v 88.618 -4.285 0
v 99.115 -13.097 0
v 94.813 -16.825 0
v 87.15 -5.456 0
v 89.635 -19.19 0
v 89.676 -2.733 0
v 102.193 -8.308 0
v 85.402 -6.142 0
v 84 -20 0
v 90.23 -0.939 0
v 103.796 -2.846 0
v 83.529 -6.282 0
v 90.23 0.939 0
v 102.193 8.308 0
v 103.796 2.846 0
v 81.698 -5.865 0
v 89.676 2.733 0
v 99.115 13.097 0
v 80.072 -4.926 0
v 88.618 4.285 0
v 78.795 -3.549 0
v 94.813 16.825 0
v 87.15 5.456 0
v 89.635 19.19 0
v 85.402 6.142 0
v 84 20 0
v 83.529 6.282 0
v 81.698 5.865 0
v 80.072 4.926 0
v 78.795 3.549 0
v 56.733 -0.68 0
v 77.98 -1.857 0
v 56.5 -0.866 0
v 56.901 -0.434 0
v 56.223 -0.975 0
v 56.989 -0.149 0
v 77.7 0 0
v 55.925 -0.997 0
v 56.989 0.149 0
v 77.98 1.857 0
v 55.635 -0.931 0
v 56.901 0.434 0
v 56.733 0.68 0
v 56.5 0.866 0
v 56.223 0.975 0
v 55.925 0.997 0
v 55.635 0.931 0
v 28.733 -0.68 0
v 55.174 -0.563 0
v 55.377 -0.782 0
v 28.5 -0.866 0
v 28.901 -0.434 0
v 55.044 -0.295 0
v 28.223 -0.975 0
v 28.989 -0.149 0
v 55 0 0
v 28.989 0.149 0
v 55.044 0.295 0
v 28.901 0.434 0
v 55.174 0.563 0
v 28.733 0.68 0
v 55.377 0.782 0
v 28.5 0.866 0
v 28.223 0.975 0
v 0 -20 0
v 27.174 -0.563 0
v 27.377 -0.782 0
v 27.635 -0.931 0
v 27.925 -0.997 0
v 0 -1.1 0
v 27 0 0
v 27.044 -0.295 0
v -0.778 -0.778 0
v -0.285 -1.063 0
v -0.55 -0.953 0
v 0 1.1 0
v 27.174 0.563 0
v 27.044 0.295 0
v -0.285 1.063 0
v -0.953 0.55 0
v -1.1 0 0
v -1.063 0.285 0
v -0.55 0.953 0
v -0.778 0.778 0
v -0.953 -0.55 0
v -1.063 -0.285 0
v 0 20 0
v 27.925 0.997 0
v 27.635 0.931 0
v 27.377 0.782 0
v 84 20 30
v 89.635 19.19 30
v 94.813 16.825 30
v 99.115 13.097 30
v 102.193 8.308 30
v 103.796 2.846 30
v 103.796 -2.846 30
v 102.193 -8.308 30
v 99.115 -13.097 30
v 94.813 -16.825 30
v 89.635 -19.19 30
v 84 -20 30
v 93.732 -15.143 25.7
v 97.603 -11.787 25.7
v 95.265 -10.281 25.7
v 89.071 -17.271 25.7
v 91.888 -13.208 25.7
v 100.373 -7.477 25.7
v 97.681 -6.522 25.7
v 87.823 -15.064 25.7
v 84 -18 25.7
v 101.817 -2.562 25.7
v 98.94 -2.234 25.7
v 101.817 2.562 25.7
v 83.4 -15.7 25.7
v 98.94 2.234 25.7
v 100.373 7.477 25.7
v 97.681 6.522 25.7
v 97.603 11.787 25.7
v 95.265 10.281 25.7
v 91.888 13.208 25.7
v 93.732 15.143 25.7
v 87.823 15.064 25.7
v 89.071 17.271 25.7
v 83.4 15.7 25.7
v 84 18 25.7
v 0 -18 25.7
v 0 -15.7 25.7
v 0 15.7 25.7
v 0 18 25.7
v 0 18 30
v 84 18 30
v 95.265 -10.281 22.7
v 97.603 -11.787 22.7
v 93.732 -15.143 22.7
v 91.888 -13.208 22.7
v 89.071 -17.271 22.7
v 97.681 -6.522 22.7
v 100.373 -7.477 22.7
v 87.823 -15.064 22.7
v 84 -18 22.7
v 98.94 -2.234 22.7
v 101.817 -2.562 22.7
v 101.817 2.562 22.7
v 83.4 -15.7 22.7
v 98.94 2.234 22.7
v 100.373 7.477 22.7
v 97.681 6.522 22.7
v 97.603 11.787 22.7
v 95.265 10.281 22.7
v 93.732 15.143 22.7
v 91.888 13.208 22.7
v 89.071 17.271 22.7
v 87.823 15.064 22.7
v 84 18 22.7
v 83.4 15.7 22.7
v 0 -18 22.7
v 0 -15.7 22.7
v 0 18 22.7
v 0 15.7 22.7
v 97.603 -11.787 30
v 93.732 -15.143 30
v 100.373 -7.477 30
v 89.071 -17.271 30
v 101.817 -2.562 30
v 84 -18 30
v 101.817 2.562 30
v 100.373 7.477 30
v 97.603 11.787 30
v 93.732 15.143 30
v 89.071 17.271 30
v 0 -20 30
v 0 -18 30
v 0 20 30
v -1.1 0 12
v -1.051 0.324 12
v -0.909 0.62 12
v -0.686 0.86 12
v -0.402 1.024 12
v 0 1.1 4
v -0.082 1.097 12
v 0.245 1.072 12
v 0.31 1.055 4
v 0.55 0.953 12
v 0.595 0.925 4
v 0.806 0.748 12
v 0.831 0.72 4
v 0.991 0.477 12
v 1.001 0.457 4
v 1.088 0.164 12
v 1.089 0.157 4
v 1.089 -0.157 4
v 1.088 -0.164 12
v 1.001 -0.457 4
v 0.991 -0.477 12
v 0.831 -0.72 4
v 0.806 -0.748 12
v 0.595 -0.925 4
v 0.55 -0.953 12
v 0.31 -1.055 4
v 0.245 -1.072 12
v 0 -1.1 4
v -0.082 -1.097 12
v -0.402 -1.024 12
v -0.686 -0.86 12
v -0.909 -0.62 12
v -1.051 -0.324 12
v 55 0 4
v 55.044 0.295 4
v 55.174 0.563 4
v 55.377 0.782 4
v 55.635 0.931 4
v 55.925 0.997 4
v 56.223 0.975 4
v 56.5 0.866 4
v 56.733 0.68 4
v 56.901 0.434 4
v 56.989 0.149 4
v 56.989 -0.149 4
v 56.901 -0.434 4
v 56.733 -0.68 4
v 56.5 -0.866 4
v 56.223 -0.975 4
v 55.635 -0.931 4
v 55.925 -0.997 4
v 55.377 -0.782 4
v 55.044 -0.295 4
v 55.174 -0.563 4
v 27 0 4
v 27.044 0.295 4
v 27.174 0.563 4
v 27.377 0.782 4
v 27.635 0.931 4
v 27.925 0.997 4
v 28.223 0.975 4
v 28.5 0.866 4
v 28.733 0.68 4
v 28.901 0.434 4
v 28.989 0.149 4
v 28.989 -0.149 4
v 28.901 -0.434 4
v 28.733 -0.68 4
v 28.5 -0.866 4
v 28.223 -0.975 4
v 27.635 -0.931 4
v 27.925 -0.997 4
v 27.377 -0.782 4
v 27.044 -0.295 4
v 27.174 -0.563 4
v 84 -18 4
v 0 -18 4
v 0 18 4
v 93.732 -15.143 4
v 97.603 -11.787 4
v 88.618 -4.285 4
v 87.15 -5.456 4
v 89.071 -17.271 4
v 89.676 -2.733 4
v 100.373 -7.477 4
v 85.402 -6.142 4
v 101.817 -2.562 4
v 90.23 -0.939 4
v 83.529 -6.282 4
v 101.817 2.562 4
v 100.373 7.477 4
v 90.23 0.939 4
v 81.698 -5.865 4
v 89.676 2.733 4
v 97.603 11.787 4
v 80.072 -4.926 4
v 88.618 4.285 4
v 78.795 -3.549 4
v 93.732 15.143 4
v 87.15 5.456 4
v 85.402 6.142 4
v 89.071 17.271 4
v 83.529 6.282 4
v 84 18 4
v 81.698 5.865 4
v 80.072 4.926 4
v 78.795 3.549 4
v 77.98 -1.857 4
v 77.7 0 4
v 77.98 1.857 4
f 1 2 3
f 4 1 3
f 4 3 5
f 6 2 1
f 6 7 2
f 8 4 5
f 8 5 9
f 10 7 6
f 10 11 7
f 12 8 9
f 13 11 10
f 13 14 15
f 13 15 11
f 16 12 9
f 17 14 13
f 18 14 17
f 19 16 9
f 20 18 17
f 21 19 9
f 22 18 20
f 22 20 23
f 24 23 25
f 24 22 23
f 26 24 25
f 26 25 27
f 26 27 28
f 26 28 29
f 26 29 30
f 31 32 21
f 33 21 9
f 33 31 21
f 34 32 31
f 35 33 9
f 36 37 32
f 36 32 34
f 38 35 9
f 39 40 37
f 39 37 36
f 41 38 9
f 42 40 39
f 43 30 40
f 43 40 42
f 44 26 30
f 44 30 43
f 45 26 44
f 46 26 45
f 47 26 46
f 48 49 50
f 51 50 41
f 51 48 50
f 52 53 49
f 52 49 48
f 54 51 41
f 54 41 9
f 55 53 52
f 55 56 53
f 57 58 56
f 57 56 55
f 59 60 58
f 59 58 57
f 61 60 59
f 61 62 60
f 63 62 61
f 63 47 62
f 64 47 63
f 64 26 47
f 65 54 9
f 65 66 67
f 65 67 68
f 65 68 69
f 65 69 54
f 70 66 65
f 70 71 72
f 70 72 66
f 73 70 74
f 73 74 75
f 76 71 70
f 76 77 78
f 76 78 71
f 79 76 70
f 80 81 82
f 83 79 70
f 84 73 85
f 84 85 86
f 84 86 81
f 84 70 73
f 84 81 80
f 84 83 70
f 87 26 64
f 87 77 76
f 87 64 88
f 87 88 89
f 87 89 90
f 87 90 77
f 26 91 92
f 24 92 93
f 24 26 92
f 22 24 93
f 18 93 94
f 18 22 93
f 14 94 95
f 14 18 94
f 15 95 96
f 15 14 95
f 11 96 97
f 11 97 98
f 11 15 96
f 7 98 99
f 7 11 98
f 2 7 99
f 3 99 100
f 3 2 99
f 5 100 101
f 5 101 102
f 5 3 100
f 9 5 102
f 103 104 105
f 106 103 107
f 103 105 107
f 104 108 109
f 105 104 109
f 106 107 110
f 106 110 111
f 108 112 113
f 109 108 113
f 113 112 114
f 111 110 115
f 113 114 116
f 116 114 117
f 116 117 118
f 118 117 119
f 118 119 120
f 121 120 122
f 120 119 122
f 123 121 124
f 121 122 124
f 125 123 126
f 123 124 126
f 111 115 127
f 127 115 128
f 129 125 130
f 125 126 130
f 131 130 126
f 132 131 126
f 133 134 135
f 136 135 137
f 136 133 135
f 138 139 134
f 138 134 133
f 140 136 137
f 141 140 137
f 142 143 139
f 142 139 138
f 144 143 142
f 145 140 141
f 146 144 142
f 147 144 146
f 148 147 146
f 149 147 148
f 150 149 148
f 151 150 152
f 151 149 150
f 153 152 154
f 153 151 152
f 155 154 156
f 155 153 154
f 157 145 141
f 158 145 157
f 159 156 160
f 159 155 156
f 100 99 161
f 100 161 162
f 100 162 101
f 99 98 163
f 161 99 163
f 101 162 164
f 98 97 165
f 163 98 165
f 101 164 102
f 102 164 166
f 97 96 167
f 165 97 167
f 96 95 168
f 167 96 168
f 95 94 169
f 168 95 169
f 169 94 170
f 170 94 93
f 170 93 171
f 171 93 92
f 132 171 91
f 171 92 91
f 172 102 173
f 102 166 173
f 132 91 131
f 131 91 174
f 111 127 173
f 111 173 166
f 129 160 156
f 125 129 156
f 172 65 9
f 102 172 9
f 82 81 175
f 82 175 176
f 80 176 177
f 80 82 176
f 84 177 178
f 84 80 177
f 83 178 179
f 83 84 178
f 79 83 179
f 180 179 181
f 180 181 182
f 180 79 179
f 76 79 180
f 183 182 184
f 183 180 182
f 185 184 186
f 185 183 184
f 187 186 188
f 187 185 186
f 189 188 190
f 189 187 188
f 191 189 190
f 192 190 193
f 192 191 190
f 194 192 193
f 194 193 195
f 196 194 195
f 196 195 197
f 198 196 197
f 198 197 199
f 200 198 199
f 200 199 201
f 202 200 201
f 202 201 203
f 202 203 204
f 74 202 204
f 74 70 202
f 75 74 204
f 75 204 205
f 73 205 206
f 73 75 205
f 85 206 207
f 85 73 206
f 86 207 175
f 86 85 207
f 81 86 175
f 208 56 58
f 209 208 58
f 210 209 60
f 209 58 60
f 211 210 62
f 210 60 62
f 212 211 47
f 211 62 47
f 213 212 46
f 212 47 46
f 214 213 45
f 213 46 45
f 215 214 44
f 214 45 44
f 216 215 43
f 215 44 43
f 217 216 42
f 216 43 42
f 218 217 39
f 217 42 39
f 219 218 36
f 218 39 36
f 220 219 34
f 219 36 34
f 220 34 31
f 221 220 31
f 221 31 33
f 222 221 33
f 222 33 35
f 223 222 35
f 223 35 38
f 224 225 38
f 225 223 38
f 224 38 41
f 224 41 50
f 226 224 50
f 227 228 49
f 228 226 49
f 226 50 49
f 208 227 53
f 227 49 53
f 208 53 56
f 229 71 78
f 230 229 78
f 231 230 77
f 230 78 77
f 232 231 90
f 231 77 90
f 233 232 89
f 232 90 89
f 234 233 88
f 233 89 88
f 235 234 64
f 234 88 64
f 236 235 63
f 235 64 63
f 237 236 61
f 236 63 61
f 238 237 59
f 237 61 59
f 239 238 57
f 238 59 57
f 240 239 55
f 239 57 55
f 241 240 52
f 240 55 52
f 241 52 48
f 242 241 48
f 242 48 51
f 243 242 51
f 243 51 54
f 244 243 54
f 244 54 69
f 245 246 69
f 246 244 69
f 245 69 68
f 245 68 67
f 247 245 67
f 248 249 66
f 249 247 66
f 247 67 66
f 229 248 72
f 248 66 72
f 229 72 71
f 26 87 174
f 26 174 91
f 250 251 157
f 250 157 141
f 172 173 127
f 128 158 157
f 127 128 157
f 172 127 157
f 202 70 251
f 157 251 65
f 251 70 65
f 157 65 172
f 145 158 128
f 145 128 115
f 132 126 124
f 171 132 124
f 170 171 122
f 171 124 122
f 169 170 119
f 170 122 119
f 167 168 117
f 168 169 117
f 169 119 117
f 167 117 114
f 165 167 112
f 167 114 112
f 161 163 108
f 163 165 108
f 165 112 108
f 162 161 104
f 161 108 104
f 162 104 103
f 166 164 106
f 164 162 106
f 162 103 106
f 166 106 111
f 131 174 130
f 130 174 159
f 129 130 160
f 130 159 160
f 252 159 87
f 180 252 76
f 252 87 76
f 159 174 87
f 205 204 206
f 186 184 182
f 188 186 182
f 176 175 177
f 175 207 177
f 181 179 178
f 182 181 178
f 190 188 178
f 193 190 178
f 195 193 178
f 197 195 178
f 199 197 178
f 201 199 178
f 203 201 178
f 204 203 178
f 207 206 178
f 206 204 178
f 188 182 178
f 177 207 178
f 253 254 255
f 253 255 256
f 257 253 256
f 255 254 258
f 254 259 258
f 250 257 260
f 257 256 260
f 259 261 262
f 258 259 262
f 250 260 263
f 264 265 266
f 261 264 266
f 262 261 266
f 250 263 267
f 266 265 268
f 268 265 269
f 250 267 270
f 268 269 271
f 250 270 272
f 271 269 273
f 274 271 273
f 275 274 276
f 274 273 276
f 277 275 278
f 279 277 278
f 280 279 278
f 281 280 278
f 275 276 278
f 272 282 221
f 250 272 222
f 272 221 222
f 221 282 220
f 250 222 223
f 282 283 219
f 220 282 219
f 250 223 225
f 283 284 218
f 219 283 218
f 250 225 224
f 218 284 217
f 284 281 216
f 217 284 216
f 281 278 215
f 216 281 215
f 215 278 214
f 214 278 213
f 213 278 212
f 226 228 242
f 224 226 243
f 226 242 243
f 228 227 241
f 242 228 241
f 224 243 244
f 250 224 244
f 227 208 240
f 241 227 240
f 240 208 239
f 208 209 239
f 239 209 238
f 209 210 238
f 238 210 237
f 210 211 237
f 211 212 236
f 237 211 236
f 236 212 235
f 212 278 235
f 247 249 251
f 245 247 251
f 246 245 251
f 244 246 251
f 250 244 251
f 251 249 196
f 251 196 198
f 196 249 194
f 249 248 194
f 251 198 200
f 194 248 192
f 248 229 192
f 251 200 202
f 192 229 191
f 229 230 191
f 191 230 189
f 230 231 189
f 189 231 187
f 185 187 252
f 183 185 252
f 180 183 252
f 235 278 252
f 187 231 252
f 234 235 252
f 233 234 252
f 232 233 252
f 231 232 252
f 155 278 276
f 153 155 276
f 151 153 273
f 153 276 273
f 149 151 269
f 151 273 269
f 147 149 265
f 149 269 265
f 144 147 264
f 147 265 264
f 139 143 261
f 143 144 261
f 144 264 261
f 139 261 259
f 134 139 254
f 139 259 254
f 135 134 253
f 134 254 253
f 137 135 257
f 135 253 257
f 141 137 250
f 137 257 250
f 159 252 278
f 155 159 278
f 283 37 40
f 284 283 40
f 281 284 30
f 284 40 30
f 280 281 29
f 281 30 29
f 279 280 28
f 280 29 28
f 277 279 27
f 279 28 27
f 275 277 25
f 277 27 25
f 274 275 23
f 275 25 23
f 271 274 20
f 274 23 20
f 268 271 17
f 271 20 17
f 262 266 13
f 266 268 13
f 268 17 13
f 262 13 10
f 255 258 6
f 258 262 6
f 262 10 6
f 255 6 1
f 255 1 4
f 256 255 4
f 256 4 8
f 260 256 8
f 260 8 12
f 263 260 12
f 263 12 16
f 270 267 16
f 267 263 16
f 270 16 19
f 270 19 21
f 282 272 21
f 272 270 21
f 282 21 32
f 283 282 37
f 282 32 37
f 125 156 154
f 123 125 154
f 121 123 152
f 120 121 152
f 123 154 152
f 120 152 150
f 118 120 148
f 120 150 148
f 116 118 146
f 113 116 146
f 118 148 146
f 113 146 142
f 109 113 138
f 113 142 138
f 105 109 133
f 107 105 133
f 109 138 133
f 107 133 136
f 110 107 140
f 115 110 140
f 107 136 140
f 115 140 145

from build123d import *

# Parameters (mm, degrees)
CYLINDER017_R     = 1
CYLINDER017_DEPTH = 10
CYLINDER018_R     = 1
CYLINDER018_DEPTH = 10
CYLINDER014_R     = 1.1
CYLINDER014_DEPTH = 12
CYLINDER_R        = 6.3
CYLINDER_DEPTH    = 52
PAD007_DEPTH      = 30
PAD006_DEPTH      = 30
PAD013_DEPTH      = 3
PAD012_DEPTH      = 3


with BuildPart() as cilindro005:
    # Cylinder017 → Cylinder017 (new body)
    with BuildSketch(Plane(origin=(-28, 0, -4), x_dir=(1, 0, 0), z_dir=(0, 0, 1))):
        Circle(CYLINDER017_R)
    extrude(amount=CYLINDER017_DEPTH)


with BuildPart() as fusion001010:
    # Cylinder018 → Cylinder018 (new body)
    with BuildSketch(Plane(origin=(-56, 0, -4), x_dir=(1, 0, 0), z_dir=(0, 0, 1))):
        Circle(CYLINDER018_R)
    extrude(amount=CYLINDER018_DEPTH)

    # Fusion001010: union Cilindro005
    add(cilindro005.part)


with BuildPart() as cilindro:
    # Cylinder014 → Cylinder014 (new body)
    with BuildSketch(Plane.XY):
        Circle(CYLINDER014_R)
    extrude(amount=CYLINDER014_DEPTH)


with BuildPart() as eje:
    # Cylinder → Cylinder (new body)
    with BuildSketch(Plane(origin=(-84, 0, -28), x_dir=(1, 0, 0), z_dir=(0, 0, 1))):
        Circle(CYLINDER_R)
    extrude(amount=CYLINDER_DEPTH)


with BuildPart() as base002:
    # Sketch009 → Pad007 (new body)
    with BuildSketch(Plane.XY):
        with BuildLine():
            Line((0, 18), (-84, 18))
            ThreePointArc((-84, 18), (-102, 0), (-84, -18))
            Line((0, -18), (-84, -18))
            Line((0, 18), (0, -18))
        make_face()
    extrude(amount=PAD007_DEPTH)


with BuildPart() as base002_1:
    # Body011 placement: moved
    add(base002.part.moved(Location((0, 0, 4))))


with BuildPart() as cut013007:
    # Sketch008 → Pad006 (new body)
    with BuildSketch(Plane.XY):
        with BuildLine():
            Line((0, 20), (-84, 20))
            ThreePointArc((-84, 20), (-104, 0), (-84, -20))
            Line((0, -20), (-84, -20))
            Line((0, 20), (0, -20))
        make_face()
    extrude(amount=PAD006_DEPTH)

    # Cut017: cut Base002
    add(base002_1.part, mode=Mode.SUBTRACT)

    # Cut018: cut Eje
    add(eje.part, mode=Mode.SUBTRACT)

    # Fusion001006: union Cilindro
    add(cilindro.part)

    # Cut013007: cut Fusion001010
    add(fusion001010.part, mode=Mode.SUBTRACT)


with BuildPart() as tapa004:
    # Sketch019 → Pad013 (new body)
    with BuildSketch(Plane.XY):
        with BuildLine():
            Line((0, 15.7), (-83.4, 15.7))
            ThreePointArc((-83.4, 15.7), (-99.1, 0), (-83.4, -15.7))
            Line((0, -15.7), (-83.4, -15.7))
            Line((0, 15.7), (0, -15.7))
        make_face()
    extrude(amount=PAD013_DEPTH)


with BuildPart() as tapa004_1:
    # Body016 placement: moved
    add(tapa004.part.moved(Location((0, 0, 26))))


with BuildPart() as fusion001014:
    # Sketch018 → Pad012 (new body)
    with BuildSketch(Plane.XY):
        with BuildLine():
            Line((0, 19), (-83.4, 19))
            ThreePointArc((-83.4, 19), (-102.4, 0), (-83.4, -19))
            Line((0, -19), (-83.4, -19))
            Line((0, 19), (0, -19))
        make_face()
    extrude(amount=PAD012_DEPTH)


with BuildPart() as fusion001014_1:
    # Body015 placement: moved
    add(fusion001014.part.moved(Location((0, 0, 26))))

    # Cut013003: cut Tapa004
    add(tapa004_1.part, mode=Mode.SUBTRACT)


with BuildPart() as fusion001014_2:
    # Cut013003 placement: moved
    add(fusion001014_1.part.moved(Location((0, 0, -3.3))))

    # Fusion001014: union Cut013007
    add(cut013007.part)


with BuildPart() as part_mirroring009:
    # Part__Mirroring009: instance of Fusion001014
    add(fusion001014_2.part.mirror(Plane(origin=(0, 0, 0), x_dir=(0, -1, 0), z_dir=(1, 0, 0))))


solid = part_mirroring009.part
